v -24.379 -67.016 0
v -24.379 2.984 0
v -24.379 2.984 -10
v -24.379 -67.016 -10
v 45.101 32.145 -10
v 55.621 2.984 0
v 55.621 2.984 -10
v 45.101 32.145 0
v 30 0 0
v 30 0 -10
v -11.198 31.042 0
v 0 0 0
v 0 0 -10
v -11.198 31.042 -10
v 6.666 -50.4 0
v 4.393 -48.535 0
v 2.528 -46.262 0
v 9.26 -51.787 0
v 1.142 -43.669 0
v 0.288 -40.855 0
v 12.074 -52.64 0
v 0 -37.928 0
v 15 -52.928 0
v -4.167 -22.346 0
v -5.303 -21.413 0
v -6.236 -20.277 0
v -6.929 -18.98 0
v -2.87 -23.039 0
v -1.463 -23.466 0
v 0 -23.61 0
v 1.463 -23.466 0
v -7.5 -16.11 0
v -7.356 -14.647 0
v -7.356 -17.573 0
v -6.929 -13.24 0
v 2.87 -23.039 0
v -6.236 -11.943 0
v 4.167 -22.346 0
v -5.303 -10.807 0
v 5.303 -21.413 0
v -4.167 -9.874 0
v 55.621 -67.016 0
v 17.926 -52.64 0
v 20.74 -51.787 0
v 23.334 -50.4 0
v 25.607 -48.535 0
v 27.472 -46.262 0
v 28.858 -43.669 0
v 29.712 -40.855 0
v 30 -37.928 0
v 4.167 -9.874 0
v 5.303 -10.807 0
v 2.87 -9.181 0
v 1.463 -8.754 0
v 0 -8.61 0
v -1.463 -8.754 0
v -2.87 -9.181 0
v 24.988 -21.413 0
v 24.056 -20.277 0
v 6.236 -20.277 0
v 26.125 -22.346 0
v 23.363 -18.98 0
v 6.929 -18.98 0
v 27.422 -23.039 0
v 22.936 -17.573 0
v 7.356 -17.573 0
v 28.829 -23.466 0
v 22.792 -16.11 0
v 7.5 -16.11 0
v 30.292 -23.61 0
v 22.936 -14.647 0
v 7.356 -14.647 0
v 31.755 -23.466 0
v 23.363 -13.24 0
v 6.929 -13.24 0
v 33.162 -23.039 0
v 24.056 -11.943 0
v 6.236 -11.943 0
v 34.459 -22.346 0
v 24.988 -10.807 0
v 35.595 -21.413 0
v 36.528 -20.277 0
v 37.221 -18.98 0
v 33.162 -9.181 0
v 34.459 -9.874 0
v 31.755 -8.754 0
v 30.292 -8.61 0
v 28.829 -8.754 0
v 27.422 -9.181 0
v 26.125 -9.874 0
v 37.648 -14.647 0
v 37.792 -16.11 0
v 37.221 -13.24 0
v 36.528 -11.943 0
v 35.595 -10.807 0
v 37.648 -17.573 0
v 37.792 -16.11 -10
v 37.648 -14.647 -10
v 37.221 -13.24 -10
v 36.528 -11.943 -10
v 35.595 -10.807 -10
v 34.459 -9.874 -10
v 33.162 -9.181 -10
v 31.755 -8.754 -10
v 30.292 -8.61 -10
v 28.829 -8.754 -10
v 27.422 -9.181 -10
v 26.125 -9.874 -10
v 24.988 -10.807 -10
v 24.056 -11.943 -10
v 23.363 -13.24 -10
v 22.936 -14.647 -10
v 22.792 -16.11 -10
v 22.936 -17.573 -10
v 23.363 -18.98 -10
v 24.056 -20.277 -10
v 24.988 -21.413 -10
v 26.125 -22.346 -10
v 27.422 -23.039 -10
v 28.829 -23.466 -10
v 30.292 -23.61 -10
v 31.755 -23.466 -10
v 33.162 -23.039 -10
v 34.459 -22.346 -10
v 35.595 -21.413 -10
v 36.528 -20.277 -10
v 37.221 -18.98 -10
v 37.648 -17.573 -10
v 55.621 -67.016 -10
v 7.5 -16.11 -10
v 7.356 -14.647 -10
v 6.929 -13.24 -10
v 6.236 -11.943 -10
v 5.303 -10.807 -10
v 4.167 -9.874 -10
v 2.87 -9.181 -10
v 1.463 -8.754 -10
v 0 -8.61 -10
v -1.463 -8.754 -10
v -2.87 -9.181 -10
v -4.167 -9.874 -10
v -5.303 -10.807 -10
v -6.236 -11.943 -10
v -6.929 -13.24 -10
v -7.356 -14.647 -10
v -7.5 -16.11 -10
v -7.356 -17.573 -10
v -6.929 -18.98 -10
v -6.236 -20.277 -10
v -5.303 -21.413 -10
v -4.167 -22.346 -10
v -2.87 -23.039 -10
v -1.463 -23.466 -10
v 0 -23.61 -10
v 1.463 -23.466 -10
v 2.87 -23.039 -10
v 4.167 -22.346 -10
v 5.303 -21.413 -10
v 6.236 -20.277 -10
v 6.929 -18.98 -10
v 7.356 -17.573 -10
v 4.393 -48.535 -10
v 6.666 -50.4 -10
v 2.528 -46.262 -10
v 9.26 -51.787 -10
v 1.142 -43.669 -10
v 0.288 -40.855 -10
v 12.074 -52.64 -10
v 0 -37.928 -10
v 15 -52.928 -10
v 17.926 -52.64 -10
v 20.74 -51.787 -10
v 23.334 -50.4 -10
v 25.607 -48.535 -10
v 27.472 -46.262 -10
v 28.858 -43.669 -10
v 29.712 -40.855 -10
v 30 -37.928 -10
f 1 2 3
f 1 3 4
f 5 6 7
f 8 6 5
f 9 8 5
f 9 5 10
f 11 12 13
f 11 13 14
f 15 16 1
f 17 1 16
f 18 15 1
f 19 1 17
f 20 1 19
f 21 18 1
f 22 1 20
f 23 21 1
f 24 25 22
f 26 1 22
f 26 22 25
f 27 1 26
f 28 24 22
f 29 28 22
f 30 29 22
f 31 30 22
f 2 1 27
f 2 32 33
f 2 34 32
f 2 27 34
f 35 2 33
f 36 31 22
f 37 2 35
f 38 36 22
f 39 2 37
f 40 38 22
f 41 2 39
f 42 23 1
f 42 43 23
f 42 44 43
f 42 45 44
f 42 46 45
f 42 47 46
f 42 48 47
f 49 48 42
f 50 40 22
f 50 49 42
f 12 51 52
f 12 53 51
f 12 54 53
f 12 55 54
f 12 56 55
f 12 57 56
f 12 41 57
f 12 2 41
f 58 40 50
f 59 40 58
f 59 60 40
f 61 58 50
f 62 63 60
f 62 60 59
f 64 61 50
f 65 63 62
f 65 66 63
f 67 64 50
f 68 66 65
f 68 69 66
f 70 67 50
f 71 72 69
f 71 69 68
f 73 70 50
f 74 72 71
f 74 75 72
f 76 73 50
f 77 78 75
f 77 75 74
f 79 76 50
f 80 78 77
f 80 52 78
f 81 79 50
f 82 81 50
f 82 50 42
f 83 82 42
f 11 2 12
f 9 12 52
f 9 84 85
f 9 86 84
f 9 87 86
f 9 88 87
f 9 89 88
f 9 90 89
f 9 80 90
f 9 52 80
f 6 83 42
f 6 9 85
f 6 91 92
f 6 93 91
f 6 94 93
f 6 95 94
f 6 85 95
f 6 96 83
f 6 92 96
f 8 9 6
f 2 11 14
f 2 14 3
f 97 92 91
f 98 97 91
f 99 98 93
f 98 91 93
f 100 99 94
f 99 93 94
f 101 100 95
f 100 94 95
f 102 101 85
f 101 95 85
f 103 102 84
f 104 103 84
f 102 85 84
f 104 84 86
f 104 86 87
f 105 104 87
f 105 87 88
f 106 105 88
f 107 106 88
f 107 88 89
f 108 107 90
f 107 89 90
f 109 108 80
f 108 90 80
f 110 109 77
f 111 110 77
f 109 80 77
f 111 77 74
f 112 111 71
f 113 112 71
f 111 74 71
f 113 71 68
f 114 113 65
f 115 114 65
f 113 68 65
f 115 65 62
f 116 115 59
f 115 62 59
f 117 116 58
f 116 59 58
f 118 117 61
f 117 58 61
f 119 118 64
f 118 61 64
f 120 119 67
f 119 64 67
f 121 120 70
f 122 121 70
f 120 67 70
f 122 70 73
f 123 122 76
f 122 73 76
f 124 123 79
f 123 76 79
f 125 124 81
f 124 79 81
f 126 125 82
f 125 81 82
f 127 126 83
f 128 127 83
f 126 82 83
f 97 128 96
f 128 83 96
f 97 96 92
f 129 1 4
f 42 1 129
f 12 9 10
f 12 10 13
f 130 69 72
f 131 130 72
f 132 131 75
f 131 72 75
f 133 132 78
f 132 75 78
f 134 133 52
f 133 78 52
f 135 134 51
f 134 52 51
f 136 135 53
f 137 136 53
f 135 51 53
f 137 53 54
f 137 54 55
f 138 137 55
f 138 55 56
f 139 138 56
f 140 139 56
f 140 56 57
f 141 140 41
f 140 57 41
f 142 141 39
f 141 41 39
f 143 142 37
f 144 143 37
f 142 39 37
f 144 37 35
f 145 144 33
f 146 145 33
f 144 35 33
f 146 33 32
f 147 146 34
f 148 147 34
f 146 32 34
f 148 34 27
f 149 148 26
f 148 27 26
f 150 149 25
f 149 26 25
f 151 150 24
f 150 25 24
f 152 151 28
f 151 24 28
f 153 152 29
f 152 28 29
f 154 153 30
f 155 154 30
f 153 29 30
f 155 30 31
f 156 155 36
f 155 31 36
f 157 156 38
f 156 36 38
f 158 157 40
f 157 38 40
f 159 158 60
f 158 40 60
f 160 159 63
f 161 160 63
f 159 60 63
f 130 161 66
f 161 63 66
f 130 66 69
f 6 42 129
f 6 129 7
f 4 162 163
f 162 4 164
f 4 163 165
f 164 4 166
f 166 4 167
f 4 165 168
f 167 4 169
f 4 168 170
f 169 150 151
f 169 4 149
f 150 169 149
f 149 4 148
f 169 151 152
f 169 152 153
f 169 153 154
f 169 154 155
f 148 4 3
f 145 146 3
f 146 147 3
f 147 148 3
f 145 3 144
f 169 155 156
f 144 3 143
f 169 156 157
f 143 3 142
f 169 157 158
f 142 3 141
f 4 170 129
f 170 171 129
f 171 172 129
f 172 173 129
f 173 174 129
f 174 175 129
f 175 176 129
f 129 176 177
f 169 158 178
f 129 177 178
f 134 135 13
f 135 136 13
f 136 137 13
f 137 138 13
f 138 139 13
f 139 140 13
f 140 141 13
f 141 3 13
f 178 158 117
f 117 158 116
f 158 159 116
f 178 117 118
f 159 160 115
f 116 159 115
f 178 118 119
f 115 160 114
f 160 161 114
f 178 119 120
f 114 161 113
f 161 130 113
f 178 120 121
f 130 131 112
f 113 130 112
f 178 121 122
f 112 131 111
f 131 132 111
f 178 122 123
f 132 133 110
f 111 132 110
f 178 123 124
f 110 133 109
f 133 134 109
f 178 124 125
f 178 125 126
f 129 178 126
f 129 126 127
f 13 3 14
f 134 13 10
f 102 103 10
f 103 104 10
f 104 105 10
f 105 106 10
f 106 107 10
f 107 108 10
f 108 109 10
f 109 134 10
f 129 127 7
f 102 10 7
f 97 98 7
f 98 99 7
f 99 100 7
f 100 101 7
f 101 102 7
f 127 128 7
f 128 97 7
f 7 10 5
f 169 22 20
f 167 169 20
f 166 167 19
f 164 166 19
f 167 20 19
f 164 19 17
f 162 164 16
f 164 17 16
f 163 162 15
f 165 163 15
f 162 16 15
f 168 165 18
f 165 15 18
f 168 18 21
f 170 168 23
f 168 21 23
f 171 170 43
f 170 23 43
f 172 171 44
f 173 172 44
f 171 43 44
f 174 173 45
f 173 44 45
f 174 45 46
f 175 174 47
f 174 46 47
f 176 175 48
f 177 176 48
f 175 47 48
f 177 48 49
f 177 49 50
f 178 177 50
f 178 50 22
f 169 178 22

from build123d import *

# Parameters (mm, degrees)
SKETCH_1_R      = 7.5
EXTRUDE_1_DEPTH = 10


with BuildPart() as part:
    # 草圖1 → 填料-伸長1 (new body)
    with BuildSketch(Plane.XY):
        Polygon((-24.379405198, -67.016021468), (55.620594802, -67.016021468), (55.620594802, 2.983978532), (45.101238557, 32.144622287), (30, 0), (0, 0), (-11.19802439, 31.04197561), (-24.379405198, 2.983978532), align=None)
        with Locations((30.291786216, -16.110047004)):
            Circle(SKETCH_1_R, mode=Mode.SUBTRACT)
        with Locations((0, -16.110047004)):
            Circle(SKETCH_1_R, mode=Mode.SUBTRACT)
        with BuildLine():
            ThreePointArc((0, -37.928378378), (15, -52.928378378), (30, -37.928378378))
            Line((30, -37.928378378), (0, -37.928378378))
        make_face(mode=Mode.SUBTRACT)
    extrude(amount=-EXTRUDE_1_DEPTH)


solid = part.part
